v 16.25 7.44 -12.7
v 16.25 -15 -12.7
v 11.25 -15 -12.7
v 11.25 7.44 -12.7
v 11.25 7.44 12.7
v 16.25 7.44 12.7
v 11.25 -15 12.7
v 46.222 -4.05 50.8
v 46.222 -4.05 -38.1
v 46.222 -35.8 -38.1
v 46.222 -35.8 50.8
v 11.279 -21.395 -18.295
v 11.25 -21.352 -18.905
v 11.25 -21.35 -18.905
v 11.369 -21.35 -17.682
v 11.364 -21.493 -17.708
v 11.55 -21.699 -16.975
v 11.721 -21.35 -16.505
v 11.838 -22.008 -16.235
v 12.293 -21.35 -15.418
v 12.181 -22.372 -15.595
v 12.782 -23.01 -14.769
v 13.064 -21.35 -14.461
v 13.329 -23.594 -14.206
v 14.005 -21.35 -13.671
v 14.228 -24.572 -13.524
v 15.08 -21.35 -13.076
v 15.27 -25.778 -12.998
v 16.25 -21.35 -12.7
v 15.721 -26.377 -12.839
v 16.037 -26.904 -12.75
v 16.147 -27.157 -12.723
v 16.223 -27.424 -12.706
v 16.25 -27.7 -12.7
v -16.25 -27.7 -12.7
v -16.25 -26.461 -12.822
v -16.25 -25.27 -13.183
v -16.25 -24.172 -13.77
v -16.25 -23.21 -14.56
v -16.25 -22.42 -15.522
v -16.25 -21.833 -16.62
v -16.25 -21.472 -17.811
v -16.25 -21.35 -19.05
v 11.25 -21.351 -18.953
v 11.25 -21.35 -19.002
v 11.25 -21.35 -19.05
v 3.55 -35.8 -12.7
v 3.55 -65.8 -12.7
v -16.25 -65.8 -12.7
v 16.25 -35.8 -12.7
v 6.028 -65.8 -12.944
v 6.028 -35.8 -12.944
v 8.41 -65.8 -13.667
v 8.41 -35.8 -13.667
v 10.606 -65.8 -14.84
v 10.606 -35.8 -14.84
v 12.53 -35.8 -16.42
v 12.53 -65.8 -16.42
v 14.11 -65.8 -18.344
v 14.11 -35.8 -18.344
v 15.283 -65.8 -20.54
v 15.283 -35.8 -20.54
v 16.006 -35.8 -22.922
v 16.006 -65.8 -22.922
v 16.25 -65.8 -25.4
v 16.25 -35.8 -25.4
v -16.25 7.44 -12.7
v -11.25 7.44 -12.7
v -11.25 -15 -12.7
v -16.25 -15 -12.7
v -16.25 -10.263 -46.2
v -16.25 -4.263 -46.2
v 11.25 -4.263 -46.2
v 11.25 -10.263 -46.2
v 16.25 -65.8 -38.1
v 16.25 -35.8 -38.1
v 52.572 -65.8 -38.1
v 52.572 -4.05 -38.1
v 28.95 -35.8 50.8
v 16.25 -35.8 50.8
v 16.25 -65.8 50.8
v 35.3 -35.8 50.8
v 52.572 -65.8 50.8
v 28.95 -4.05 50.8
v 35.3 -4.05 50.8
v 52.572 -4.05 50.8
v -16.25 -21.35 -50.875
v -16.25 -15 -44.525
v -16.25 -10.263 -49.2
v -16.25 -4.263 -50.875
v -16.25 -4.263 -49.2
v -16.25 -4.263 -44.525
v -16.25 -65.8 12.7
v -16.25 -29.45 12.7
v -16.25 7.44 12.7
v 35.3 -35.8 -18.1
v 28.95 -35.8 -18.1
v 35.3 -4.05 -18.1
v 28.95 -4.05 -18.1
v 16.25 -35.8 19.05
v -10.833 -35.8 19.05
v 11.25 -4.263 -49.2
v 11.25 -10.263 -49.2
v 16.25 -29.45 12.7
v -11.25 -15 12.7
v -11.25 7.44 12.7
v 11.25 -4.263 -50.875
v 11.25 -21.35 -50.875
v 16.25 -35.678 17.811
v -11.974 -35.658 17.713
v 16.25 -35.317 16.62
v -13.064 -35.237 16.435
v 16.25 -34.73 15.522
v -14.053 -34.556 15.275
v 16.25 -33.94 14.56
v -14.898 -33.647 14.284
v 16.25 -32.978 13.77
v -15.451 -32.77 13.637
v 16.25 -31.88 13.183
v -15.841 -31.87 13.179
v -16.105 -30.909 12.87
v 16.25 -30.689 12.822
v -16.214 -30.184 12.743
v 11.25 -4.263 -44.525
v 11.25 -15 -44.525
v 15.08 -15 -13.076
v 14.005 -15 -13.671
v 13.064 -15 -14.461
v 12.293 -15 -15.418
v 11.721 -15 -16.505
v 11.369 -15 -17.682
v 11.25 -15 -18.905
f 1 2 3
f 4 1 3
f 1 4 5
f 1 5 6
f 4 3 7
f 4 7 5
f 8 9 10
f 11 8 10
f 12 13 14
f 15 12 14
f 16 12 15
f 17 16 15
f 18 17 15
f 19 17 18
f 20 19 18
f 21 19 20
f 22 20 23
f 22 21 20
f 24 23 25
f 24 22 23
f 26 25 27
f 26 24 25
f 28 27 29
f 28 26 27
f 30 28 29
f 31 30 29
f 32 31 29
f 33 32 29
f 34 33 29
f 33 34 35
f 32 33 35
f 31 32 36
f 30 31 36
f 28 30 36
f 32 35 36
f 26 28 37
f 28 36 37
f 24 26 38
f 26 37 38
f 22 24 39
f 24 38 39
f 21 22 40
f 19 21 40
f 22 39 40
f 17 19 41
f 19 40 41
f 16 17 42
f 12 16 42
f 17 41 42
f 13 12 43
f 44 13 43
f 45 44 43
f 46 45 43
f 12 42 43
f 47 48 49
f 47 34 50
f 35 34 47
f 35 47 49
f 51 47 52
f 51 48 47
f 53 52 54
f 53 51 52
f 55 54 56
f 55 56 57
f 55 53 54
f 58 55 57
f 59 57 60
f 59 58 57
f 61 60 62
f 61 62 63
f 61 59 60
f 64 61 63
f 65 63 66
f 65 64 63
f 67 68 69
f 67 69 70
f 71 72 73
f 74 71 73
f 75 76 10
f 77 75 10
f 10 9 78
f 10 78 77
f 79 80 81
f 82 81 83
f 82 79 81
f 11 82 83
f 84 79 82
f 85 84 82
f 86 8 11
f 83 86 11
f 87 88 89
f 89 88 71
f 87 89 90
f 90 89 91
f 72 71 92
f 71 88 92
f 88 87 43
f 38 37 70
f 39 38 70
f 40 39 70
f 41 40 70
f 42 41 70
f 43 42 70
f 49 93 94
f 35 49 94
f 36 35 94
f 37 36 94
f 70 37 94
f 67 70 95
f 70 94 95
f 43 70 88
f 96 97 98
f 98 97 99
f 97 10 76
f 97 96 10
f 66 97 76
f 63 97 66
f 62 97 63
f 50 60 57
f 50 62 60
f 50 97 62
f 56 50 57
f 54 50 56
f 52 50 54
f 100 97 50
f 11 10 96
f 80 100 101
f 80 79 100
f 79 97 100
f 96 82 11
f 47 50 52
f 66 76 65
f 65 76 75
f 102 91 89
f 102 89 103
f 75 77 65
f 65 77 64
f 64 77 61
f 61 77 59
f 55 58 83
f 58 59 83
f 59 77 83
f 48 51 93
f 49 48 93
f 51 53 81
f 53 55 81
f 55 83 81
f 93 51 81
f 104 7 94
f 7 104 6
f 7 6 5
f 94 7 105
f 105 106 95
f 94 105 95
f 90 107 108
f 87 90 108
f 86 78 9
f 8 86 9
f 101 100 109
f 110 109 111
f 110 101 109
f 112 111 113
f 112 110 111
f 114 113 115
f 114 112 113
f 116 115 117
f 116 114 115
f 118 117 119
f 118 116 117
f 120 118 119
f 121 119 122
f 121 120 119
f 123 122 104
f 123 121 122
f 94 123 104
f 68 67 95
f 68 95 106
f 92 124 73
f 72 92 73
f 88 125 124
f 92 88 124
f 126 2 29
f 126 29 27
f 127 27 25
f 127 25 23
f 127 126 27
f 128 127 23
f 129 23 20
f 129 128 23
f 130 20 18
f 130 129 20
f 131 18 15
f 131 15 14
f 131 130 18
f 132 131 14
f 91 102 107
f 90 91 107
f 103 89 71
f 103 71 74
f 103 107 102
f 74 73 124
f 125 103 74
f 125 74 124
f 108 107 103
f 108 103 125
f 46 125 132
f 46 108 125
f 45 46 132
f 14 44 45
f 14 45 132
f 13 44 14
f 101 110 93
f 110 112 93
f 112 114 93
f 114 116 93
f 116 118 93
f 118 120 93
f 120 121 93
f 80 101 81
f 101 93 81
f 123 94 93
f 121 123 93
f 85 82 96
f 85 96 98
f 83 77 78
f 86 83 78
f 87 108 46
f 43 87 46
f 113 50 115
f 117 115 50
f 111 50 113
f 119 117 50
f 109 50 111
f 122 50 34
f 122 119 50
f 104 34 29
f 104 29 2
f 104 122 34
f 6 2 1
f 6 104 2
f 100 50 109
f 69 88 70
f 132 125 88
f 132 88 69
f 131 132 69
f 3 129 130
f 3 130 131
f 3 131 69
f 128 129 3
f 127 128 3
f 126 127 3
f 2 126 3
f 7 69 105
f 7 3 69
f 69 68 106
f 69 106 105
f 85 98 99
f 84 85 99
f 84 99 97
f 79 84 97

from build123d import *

# Parameters (mm, degrees)
BOSS_EXTRUDE1_DEPTH             = 12.7
BOSS_EXTRUDE2_REACH             = 70.956
BOSS_EXTRUDE2_DIRECTION_2_REACH = 70.956
SKETCH5_W                       = 27.5
SKETCH5_H                       = 3
CUT_EXTRUDE1_DEPTH              = 6
FILLET2_R                       = 6.35
FILLET3_START                   = -16.25
FILLET3_DEPTH                   = 32.5
FILLET3_START_2                 = -29
FILLET3_2_DEPTH                 = 7.65
BOSS_EXTRUDE3_DEPTH             = 38.1
BOSS_EXTRUDE3_DEPTH_BACK        = 50.8
CUT_EXTRUDE2_REACH              = 96.662
SKETCH7_W                       = 20
SKETCH7_H                       = 31.75
FILLET4_R                       = 12.7
BOSS_EXTRUDE4_DEPTH             = 30
FILLET6_R                       = 6.35


with BuildPart() as part:
    # Sketch2 → Boss-Extrude1 (new, symmetric)
    with BuildSketch(Plane.XY):
        Polygon((-11.25, 7.44), (-11.25, -15), (11.25, -15), (11.25, 7.44), (16.25, 7.44), (16.25, -65.8), (-16.25, -65.8), (-16.25, 7.44), align=None)
    extrude(amount=BOSS_EXTRUDE1_DEPTH, both=True)

    # Boss-Extrude2: up to this face of the body (flat: up to its plane)
    boss_extrude2_end = Plane(part.part.faces().sort_by_distance((11.25, -3.78, 0))[0])
    # Sketch4 → Boss-Extrude2 (add, up to the picked face)
    with BuildSketch(Plane(origin=(0, 0, 0), x_dir=(0, 0, -1), z_dir=(1, 0, 0)), mode=Mode.PRIVATE) as boss_extrude2_sk1:
        Polygon((12.7, -15), (44.525, -15), (44.525, -4.262817999), (50.875, -4.262817999), (50.875, -21.35), (12.7, -21.35), align=None)
    boss_extrude2_tool1 = split(extrude(boss_extrude2_sk1.sketch, amount=BOSS_EXTRUDE2_REACH, mode=Mode.PRIVATE), bisect_by=boss_extrude2_end, keep=Keep.BOTH, mode=Mode.PRIVATE)
    add(boss_extrude2_tool1.solids().sort_by(Axis((0, -16.299514, -35.280605), (1, 0, 0)))[0])

    # Boss-Extrude2 direction 2: up to this face of the body (flat: up to its plane)
    boss_extrude2_direction_2_end = Plane(part.part.faces().sort_by_distance((-16.25, -29.18, 0))[0])
    # Sketch4 → Boss-Extrude2 direction 2 (add, up to the picked face)
    with BuildSketch(Plane(origin=(0, 0, 0), x_dir=(0, 0, -1), z_dir=(1, 0, 0)), mode=Mode.PRIVATE) as boss_extrude2_direction_2_sk1:
        Polygon((12.7, -15), (44.525, -15), (44.525, -4.262817999), (50.875, -4.262817999), (50.875, -21.35), (12.7, -21.35), align=None)
    boss_extrude2_direction_2_tool1 = split(extrude(boss_extrude2_direction_2_sk1.sketch, amount=-BOSS_EXTRUDE2_DIRECTION_2_REACH, mode=Mode.PRIVATE), bisect_by=boss_extrude2_direction_2_end, keep=Keep.BOTH, mode=Mode.PRIVATE)
    add(boss_extrude2_direction_2_tool1.solids().sort_by(Axis((0, -16.299514, -35.280605), (-1, 0, 0)))[0])

    # Sketch5 → Cut-Extrude1 (cut)
    with BuildSketch(Plane(origin=(0, -4.262817999, 0), x_dir=(1, 0, 0), z_dir=(0, 1, 0))):
        with Locations((-2.5, 47.7)):
            Rectangle(SKETCH5_W, SKETCH5_H)
    extrude(amount=-CUT_EXTRUDE1_DEPTH, mode=Mode.SUBTRACT)

    # Fillet2
    # the kernel refuses this fillet: 6.35 mm, written as the material it adds along each edge
    with BuildSketch(Plane(origin=(11.25, -15, -12.7), x_dir=(0, 0, -1), z_dir=(0, -1, 0))) as fillet2_piece_1:
        with BuildLine():
            CenterArc((6.204836823, 6.35), FILLET2_R, 192.274670215, 77.725329785)
            Line((0, 5), (0, 0))
            Line((0, 0), (6.204836823, 0))
        make_face()
    extrude(amount=6.35)

    # Fillet3: read off the stored shape, not the designer's step
    # Fillet3 outline → Fillet3 (add)
    with BuildSketch(Plane.YZ.offset(FILLET3_START)):
        with BuildLine():
            Line((-21.35, -12.7), (-27.7, -12.7))
            ThreePointArc((-27.7, -12.7), (-23.209871939, -14.559871939), (-21.35, -19.05))
            Line((-21.35, -19.05), (-21.35, -12.7))
        make_face()
    extrude(amount=FILLET3_DEPTH)

    # Fillet3 2 outline → Fillet3 2 (cut)
    with BuildSketch(Plane(origin=(0, 0, 0), x_dir=(1, 0, 0), z_dir=(0, 1, 0)).offset(FILLET3_START_2)):
        with BuildLine():
            Line((11.25, 21), (11.25, 18.904836823))
            ThreePointArc((11.25, 18.904836823), (12.655571335, 14.920476752), (16.250039425, 12.699991422))
            Line((16.250039425, 12.699991422), (18, 12.319260294))
            Line((18, 12.319260294), (18, 21))
            Line((18, 21), (11.25, 21))
        make_face()
    extrude(amount=FILLET3_2_DEPTH, mode=Mode.SUBTRACT)

    # Sketch6 → Boss-Extrude3 (add, two sides: drawn at the far end of the back side and taken through both)
    with BuildSketch(Plane.XY.offset(12.7).offset(-BOSS_EXTRUDE3_DEPTH_BACK)):
        Polygon((16.25, -65.8), (52.572, -65.8), (52.572, -4.05), (46.222, -4.05), (46.222, -35.8), (35.3, -35.8), (35.3, -4.05), (28.95, -4.05), (28.95, -35.8), (16.25, -35.8), align=None)
    extrude(amount=BOSS_EXTRUDE3_DEPTH + BOSS_EXTRUDE3_DEPTH_BACK)

    # Sketch7 → Cut-Extrude2 (cut, up to next)
    with BuildSketch(Plane.ZY.offset(-28.95), mode=Mode.PRIVATE) as cut_extrude2_sk1:
        with Locations((-28.1, -19.925)):
            Rectangle(SKETCH7_W, SKETCH7_H)
    cut_extrude2_tool1 = extrude(cut_extrude2_sk1.sketch, amount=-CUT_EXTRUDE2_REACH, mode=Mode.PRIVATE) & part.part
    add(cut_extrude2_tool1.solids().sort_by_distance((28.95, -19.925, -28.1))[0], mode=Mode.SUBTRACT)

    # Fillet4
    fillet4_edges = [part.edges().sort_by_distance(p)[0] for p in [
        (16.25, -50.8, -12.7),
    ]]
    fillet(fillet4_edges, radius=FILLET4_R)

    # Sketch8 → Boss-Extrude4 (add)
    with BuildSketch(Plane.XZ.offset(65.8)):
        Polygon((-16.25, 12.7), (16.25, 50.8), (16.25, 12.7), align=None)
    extrude(amount=-BOSS_EXTRUDE4_DEPTH)

    # Fillet6
    fillet6_edges = [part.edges().sort_by_distance(p)[0] for p in [
        (0, -35.8, 12.7),
    ]]
    fillet(fillet6_edges, radius=FILLET6_R)


solid = part.part
